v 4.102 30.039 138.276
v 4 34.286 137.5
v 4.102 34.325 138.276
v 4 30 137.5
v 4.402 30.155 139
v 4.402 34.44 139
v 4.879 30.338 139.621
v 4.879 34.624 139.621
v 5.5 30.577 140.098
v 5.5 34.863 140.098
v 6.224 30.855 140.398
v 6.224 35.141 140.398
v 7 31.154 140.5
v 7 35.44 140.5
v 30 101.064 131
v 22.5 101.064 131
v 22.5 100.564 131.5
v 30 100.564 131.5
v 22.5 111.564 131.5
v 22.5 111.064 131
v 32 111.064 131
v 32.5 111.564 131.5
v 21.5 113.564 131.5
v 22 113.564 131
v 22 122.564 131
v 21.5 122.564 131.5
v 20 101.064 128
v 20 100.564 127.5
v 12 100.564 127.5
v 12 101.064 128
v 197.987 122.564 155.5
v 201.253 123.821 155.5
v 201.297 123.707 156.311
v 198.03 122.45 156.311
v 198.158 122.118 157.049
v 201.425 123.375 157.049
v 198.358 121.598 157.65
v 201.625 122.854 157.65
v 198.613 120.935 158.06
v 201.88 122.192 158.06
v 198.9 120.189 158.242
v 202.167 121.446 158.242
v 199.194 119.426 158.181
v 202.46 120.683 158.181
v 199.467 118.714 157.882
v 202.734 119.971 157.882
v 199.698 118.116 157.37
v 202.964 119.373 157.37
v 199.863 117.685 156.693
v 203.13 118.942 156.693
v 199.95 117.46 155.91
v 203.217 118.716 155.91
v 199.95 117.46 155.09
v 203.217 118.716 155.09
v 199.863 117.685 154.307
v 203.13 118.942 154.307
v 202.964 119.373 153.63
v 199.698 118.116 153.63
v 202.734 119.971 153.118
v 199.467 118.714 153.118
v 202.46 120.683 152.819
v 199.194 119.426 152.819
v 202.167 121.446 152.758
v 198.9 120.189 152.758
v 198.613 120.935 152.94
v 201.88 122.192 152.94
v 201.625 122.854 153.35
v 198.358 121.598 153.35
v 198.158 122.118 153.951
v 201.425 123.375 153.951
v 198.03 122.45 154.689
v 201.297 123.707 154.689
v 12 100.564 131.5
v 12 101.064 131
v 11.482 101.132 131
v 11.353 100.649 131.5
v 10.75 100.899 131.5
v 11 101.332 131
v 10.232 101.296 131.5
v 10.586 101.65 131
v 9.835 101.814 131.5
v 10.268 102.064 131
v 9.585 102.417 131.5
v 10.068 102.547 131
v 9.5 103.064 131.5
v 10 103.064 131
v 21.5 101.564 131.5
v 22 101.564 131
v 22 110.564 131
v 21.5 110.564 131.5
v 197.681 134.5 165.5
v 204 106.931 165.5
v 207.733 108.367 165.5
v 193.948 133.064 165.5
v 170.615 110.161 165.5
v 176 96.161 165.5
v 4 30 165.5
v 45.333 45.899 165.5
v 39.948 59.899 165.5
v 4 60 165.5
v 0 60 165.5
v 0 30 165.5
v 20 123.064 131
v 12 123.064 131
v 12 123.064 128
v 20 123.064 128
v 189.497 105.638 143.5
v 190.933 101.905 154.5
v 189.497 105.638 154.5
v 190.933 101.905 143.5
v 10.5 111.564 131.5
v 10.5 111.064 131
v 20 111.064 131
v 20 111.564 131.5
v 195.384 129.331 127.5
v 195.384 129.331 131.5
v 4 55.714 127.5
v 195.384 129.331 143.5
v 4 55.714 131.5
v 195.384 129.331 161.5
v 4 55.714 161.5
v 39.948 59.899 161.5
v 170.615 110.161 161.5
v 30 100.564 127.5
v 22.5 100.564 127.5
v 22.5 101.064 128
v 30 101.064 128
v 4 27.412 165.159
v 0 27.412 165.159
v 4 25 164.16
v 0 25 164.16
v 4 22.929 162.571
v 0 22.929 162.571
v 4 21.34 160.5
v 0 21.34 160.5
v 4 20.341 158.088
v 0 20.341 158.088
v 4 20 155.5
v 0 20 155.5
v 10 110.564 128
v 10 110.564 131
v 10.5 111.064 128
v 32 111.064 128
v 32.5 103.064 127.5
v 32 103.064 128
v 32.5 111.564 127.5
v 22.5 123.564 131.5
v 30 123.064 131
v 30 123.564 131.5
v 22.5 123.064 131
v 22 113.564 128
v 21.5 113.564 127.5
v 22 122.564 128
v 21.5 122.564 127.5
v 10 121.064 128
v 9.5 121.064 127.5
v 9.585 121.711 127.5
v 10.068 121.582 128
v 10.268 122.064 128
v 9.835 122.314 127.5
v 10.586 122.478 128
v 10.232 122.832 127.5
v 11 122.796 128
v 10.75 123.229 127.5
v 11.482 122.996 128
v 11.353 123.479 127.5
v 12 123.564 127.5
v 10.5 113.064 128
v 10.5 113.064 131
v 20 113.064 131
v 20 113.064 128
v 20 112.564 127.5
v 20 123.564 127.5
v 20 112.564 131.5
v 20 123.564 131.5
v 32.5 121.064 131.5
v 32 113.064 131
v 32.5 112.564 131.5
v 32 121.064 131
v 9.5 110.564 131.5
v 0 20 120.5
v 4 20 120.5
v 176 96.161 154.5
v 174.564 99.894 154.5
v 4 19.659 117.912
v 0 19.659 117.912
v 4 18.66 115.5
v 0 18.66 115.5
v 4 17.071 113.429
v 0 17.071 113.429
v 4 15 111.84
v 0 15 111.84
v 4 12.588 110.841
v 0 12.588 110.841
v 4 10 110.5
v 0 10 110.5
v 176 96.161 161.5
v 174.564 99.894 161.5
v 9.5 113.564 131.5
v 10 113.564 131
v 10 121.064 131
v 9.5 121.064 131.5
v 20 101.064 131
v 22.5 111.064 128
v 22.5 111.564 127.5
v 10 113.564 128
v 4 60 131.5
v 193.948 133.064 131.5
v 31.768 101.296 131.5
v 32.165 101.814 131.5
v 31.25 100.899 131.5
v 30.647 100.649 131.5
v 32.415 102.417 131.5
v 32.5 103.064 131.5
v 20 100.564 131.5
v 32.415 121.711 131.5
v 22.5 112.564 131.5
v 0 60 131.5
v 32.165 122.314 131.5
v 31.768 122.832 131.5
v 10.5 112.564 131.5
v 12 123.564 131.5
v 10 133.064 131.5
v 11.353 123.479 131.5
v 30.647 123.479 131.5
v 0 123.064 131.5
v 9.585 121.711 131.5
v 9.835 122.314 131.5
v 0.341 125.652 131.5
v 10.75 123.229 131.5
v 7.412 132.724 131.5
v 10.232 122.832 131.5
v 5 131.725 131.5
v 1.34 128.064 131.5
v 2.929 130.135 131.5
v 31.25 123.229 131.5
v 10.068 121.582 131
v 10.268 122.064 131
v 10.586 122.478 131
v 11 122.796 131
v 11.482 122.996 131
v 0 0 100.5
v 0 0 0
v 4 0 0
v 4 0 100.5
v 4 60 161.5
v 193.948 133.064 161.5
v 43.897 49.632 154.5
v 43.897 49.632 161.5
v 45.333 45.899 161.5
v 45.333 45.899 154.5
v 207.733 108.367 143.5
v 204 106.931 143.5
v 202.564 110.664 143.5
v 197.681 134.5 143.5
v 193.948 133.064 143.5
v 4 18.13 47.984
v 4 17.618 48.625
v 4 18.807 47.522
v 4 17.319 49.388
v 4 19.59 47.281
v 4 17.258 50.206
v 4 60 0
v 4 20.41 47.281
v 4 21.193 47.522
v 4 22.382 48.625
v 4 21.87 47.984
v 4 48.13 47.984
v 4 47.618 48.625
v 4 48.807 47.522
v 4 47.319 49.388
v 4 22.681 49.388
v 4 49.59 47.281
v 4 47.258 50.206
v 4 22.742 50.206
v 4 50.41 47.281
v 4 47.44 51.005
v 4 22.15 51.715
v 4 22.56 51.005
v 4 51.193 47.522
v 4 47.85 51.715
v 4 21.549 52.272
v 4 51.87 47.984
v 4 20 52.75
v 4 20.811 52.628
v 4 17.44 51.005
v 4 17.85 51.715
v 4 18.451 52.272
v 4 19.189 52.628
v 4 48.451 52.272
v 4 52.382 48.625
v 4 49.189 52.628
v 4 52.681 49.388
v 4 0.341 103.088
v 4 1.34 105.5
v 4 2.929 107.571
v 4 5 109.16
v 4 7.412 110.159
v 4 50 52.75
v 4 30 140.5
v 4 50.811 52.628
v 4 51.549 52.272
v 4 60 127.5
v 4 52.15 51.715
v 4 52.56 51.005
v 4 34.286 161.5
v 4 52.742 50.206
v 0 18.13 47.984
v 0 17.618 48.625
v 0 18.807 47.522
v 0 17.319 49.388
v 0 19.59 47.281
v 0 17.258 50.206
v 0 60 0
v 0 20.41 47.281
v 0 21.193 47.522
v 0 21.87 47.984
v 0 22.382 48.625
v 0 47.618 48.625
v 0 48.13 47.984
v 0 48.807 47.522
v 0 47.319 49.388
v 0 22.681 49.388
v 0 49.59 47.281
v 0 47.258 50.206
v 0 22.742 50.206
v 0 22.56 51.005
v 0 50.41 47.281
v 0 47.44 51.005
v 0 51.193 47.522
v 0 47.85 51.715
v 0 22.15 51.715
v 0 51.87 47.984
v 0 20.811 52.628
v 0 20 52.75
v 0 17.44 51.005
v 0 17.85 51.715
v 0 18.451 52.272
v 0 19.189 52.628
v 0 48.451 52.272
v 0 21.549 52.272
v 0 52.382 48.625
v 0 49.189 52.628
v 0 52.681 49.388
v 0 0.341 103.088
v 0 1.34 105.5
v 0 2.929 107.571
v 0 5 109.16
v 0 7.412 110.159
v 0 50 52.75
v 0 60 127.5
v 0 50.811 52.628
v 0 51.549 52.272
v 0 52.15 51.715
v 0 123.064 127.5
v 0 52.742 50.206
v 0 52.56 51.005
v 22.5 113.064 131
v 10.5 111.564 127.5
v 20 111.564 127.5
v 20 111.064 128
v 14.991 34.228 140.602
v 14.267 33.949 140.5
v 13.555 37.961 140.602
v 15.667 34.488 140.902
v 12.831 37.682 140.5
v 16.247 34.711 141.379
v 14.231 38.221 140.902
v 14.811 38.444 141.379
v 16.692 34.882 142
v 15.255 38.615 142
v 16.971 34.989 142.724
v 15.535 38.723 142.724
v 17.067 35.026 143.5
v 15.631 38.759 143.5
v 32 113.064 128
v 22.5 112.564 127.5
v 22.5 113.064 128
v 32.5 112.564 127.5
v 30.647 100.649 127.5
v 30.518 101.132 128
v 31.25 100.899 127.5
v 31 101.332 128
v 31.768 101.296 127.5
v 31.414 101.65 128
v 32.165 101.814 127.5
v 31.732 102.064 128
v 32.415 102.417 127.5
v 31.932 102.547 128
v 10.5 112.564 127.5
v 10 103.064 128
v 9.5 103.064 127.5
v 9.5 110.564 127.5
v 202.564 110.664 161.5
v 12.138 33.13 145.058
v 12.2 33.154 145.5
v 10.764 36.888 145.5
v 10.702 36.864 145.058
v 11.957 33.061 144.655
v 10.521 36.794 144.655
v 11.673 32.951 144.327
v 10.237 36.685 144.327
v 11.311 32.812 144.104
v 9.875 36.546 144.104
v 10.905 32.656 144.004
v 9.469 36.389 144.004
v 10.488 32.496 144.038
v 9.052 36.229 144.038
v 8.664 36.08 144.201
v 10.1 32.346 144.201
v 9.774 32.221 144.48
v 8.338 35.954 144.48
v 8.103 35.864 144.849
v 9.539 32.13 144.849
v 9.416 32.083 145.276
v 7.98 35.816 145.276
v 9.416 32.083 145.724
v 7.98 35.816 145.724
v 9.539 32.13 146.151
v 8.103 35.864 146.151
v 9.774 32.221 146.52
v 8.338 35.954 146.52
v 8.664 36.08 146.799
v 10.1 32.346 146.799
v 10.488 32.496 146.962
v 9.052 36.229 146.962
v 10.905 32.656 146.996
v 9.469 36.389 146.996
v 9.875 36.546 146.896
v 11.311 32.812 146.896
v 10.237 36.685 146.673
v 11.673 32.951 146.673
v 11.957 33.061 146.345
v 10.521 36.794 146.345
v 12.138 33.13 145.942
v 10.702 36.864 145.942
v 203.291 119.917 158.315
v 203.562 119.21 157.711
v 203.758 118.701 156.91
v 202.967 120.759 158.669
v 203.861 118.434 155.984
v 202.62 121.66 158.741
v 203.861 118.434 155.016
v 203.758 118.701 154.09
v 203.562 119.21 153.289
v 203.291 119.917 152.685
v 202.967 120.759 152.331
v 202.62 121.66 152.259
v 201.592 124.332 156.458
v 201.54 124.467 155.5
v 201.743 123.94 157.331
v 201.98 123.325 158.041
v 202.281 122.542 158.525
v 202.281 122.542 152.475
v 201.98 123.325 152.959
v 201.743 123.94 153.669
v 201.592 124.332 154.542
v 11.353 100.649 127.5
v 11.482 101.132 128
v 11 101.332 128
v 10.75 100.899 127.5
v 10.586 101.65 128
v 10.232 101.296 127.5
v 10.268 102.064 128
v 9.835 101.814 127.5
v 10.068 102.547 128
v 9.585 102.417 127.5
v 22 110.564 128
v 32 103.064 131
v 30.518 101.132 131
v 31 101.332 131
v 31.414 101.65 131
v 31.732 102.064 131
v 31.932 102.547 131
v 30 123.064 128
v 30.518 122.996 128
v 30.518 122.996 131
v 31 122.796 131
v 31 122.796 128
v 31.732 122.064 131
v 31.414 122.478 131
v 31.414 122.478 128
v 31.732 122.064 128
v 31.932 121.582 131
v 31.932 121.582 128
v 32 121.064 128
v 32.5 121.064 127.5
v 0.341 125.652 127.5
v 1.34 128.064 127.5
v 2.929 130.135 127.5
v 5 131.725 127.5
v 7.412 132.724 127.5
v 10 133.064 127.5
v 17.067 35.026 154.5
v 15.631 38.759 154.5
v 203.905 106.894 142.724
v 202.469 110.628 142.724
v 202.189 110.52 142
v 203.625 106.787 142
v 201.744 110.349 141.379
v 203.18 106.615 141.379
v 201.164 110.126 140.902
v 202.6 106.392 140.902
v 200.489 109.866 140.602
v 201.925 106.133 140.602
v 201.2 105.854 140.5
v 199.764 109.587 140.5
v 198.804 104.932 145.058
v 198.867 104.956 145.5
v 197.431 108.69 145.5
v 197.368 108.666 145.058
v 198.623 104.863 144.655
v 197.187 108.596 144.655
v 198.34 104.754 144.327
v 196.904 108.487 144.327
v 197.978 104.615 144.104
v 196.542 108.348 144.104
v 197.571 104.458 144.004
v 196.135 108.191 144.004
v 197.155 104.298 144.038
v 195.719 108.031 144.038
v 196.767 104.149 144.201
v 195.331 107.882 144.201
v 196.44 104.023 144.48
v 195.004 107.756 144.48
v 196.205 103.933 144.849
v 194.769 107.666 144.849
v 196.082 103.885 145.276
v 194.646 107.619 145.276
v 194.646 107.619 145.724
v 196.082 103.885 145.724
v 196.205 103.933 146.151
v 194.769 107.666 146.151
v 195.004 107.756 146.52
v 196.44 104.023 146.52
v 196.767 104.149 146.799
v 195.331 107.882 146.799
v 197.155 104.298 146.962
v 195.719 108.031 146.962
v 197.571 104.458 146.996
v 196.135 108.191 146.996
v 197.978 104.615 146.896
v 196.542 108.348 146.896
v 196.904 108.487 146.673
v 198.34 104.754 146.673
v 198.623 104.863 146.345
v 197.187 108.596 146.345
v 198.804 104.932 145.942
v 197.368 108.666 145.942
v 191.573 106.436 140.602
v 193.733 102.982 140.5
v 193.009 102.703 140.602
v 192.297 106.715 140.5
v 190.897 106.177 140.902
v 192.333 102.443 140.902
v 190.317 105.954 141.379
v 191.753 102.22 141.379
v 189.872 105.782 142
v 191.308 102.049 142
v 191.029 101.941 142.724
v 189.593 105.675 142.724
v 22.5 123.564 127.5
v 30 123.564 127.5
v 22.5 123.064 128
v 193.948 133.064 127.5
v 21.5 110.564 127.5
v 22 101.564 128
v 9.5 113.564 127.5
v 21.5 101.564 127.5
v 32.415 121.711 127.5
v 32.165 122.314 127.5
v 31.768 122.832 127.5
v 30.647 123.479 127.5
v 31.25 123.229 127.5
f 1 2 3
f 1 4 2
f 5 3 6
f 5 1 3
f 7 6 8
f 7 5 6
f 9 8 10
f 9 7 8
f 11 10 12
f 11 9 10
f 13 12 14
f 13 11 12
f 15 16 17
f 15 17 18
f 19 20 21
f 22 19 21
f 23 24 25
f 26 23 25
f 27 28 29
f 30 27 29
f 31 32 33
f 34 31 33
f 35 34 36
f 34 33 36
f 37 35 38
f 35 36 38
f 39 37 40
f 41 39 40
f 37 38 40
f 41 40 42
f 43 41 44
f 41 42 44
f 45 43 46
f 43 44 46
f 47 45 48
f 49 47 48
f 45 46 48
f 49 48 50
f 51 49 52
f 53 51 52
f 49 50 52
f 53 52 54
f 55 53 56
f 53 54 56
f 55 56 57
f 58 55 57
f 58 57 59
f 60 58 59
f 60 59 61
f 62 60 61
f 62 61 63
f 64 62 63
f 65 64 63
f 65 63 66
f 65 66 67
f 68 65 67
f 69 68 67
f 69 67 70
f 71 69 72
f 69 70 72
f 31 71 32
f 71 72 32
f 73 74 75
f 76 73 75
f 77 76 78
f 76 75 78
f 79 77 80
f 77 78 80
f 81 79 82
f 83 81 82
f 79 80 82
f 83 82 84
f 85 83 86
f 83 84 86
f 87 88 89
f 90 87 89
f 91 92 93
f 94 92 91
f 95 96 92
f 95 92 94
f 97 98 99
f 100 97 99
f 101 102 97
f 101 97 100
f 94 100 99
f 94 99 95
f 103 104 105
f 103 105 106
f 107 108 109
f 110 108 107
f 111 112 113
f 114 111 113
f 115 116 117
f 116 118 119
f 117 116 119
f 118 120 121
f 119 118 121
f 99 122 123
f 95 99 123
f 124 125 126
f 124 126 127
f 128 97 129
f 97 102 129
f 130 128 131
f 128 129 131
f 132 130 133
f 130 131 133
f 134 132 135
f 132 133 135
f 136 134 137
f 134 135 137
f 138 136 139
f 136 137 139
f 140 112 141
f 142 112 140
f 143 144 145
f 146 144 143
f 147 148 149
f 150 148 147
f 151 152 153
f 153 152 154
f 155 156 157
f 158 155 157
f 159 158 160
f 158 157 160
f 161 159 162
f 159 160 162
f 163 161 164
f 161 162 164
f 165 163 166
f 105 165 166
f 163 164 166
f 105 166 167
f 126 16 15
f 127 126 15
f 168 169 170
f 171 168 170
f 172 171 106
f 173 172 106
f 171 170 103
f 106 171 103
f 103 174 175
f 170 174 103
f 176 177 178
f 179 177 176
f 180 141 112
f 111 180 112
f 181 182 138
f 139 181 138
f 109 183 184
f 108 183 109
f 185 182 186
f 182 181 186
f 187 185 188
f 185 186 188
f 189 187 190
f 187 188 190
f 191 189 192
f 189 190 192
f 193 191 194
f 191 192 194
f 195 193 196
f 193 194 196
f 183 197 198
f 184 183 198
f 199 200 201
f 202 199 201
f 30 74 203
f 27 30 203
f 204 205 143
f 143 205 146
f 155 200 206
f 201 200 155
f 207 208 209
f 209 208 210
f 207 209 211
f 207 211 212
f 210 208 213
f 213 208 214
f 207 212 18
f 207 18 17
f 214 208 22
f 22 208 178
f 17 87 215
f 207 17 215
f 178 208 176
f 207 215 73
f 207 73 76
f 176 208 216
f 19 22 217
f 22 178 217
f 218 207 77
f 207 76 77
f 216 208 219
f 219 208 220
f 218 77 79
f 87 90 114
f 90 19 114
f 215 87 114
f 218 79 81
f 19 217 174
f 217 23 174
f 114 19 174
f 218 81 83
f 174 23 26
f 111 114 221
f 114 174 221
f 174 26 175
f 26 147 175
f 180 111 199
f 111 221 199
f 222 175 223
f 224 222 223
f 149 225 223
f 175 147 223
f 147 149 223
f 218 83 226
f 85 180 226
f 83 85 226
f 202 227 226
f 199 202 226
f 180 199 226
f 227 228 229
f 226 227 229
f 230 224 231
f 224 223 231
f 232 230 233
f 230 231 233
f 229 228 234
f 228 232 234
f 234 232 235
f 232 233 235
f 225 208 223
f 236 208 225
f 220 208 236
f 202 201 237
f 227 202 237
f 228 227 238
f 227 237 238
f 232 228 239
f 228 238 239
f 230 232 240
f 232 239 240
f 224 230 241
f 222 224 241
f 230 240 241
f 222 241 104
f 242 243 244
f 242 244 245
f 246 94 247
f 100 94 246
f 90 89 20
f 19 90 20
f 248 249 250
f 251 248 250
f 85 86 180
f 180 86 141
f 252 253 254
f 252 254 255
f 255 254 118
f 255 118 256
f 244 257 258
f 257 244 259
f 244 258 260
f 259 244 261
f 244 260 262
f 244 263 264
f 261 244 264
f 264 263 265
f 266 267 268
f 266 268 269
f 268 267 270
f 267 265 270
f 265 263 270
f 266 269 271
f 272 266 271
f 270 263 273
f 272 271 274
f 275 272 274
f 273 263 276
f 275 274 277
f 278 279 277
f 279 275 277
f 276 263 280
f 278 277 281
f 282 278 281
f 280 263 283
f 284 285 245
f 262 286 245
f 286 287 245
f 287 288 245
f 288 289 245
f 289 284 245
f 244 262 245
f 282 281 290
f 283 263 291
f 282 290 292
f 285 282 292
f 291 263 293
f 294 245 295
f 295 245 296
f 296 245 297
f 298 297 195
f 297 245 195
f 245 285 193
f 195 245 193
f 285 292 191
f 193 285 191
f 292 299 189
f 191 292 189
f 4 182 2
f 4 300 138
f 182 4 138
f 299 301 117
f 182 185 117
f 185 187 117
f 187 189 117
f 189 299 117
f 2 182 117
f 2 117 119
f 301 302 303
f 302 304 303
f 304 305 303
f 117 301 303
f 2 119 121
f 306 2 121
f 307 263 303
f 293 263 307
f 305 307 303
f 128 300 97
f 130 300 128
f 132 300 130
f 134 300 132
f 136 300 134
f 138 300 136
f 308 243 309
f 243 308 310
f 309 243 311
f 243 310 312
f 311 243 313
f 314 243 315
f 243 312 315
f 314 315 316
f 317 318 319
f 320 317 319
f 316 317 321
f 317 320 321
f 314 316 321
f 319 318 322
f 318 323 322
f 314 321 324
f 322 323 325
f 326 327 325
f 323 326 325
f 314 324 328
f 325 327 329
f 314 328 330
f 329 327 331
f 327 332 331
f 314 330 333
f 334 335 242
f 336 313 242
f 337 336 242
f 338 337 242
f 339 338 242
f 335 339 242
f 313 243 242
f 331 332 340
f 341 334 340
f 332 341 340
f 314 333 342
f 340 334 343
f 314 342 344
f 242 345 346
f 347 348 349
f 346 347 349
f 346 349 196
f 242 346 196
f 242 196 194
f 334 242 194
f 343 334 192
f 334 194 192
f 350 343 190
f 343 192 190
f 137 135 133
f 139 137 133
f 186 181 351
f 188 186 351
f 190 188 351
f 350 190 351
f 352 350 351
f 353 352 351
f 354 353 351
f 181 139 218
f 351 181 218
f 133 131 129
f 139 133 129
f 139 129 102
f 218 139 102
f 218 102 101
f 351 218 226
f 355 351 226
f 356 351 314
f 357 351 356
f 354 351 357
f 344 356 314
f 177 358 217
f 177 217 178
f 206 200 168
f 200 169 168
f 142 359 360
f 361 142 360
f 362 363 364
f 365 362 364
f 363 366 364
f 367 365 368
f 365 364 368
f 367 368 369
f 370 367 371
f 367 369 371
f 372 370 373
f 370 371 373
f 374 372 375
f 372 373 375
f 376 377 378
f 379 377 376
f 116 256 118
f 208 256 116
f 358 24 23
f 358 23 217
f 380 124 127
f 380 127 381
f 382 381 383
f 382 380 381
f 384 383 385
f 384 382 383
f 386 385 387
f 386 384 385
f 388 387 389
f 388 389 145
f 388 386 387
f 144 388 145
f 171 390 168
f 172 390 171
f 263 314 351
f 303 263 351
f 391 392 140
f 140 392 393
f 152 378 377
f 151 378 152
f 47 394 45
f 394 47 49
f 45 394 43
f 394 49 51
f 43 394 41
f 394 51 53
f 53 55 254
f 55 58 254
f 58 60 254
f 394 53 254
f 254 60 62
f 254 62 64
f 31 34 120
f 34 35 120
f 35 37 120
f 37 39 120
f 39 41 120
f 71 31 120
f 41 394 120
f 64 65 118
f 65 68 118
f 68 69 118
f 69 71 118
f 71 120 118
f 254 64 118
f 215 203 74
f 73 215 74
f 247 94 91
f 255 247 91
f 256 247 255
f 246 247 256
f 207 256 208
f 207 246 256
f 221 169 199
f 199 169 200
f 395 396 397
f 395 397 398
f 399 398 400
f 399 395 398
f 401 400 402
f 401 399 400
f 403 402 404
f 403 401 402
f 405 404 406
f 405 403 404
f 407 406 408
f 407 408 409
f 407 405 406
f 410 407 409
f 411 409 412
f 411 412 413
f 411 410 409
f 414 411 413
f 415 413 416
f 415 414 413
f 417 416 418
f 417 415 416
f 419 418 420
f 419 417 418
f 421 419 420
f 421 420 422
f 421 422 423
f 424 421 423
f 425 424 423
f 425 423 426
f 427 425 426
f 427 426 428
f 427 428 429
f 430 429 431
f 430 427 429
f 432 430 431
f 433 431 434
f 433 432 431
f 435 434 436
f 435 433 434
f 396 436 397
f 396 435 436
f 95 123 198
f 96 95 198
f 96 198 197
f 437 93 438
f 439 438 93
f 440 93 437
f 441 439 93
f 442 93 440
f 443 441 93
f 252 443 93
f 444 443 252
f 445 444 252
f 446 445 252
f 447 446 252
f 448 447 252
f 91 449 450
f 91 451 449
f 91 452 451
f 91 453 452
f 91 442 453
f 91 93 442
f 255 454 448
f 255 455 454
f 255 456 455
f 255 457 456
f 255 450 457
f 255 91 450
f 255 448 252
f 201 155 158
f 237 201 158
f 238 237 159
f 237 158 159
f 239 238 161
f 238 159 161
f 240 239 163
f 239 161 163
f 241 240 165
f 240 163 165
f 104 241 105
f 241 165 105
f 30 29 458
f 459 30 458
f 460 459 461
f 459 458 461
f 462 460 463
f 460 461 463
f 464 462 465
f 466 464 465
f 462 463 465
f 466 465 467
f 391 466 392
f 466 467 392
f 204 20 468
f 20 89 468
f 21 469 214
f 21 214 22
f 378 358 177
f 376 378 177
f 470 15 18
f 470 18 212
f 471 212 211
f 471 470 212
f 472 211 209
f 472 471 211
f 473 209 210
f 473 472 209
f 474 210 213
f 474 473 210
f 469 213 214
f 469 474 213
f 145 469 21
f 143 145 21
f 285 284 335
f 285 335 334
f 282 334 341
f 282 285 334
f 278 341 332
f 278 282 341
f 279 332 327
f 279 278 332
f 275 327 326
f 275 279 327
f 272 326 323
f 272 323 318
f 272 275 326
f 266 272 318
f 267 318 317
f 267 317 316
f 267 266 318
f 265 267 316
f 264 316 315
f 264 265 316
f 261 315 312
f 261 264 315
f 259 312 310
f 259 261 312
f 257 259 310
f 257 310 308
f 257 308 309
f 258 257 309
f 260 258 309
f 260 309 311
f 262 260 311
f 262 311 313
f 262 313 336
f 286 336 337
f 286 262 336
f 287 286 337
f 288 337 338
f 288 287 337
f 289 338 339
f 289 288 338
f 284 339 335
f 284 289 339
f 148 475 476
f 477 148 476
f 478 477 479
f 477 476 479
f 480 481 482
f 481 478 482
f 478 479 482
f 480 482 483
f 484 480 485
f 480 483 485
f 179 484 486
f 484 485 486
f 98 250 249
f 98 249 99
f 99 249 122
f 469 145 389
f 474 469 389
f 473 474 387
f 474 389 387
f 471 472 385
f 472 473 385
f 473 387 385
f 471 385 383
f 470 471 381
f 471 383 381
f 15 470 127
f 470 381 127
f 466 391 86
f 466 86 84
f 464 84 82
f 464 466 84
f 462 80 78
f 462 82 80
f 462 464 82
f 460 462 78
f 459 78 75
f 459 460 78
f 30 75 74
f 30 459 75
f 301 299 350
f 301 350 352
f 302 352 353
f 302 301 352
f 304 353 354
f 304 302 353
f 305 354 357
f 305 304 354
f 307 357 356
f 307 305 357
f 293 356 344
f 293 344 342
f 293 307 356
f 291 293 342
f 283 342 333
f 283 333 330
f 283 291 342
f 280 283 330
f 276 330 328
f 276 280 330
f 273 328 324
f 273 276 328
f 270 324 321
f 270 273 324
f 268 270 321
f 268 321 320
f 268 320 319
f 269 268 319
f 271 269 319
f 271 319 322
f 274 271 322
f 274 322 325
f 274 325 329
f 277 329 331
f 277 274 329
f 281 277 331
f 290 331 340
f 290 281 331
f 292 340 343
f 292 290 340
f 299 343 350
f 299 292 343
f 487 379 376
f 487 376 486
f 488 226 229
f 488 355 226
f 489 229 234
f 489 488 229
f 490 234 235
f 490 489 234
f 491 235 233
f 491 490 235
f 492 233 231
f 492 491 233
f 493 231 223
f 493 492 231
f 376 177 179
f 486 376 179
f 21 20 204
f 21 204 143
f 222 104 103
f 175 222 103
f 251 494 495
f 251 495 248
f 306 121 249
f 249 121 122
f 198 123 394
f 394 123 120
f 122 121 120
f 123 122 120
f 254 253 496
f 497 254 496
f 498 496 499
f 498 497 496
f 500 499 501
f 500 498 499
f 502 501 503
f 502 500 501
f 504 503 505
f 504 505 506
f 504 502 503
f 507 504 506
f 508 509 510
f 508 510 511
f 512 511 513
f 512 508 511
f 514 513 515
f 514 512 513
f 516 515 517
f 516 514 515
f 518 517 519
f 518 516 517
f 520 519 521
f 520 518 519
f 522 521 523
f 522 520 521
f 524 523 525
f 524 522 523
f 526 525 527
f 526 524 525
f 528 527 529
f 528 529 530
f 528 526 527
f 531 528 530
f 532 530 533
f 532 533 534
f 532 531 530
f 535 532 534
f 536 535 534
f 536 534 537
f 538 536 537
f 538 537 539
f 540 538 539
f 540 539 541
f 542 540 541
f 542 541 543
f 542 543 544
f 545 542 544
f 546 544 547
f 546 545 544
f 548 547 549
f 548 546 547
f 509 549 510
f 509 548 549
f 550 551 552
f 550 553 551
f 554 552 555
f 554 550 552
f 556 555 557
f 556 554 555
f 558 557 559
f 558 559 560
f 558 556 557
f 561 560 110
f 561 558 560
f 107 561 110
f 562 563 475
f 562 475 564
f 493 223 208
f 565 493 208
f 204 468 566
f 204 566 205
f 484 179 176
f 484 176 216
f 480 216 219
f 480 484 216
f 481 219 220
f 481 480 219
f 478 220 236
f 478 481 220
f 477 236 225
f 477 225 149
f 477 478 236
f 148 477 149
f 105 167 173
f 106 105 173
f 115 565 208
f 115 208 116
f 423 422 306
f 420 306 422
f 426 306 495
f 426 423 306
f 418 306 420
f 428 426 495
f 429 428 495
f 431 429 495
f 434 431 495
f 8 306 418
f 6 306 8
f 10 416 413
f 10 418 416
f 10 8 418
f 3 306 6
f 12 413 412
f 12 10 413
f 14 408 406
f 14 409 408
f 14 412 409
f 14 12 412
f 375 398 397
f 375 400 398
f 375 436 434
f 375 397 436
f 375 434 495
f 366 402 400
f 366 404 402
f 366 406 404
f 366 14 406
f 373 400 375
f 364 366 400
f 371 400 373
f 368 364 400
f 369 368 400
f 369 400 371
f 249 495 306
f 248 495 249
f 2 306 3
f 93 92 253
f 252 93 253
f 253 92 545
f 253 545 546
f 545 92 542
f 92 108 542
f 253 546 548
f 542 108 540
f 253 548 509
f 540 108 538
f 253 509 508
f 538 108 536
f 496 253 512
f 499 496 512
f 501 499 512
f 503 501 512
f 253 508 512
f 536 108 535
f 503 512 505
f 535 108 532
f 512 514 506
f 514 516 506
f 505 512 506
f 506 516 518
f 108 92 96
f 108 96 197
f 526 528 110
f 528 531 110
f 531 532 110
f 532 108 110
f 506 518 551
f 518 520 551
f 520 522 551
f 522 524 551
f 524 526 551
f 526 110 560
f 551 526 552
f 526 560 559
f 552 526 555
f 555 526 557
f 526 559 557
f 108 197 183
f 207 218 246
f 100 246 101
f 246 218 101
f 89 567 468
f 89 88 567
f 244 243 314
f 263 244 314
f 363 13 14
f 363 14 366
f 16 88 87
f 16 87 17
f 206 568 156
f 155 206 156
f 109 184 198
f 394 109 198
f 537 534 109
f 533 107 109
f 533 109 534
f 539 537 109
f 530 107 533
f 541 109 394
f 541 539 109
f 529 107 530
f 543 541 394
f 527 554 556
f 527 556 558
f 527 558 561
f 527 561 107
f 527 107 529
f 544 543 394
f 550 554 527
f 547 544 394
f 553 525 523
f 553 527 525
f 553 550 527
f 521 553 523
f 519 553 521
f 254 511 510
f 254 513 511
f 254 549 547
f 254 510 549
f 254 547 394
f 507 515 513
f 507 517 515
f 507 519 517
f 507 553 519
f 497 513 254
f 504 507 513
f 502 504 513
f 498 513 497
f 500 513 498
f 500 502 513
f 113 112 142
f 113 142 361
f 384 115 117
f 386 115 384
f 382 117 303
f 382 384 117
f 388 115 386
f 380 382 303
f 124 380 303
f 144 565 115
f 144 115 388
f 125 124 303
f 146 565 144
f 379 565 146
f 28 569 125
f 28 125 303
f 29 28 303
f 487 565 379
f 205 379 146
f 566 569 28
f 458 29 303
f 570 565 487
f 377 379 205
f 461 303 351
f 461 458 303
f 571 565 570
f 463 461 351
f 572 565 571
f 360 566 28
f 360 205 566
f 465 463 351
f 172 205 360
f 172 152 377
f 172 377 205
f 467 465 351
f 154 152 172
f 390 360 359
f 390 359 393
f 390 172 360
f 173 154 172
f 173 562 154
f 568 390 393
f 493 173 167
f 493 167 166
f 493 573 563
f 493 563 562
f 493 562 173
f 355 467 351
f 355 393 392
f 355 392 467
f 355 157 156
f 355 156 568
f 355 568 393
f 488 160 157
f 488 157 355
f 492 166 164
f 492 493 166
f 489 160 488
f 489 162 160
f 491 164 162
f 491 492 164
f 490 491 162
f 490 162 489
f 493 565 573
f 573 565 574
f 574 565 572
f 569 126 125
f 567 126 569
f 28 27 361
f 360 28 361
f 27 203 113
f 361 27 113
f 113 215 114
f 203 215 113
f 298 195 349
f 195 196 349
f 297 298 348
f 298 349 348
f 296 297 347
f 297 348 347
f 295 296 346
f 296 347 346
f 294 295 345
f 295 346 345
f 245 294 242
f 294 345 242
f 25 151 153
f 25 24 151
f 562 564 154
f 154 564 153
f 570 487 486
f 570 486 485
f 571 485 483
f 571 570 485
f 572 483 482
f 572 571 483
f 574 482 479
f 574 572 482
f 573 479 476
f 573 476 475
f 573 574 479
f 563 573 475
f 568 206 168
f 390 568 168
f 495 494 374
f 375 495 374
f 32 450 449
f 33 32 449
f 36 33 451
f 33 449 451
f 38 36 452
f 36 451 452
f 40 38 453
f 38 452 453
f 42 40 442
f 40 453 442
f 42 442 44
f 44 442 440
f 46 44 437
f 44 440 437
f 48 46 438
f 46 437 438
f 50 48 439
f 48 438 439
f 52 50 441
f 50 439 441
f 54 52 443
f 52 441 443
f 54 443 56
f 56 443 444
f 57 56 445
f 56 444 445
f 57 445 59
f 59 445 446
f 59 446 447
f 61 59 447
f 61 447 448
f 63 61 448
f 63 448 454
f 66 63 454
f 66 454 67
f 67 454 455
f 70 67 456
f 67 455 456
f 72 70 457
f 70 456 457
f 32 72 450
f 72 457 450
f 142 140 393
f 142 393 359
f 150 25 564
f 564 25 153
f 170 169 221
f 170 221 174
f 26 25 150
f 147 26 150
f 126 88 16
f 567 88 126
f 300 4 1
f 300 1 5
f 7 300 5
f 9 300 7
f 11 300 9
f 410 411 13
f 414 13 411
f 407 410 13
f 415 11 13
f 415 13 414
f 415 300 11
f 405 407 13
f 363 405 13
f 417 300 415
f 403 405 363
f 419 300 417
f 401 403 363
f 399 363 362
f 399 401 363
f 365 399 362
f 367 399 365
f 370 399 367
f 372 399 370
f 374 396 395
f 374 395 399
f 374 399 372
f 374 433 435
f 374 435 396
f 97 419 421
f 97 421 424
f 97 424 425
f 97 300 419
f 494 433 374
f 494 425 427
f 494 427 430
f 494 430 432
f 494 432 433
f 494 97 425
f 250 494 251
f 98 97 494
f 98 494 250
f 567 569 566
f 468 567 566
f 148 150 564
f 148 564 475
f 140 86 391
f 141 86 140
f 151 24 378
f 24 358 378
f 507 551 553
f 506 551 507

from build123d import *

# Parameters (mm, degrees)
SKETCH_1_W               = 165.5
SKETCH_1_H               = 60
EXTRUDE_1_DEPTH          = 4
EXTRUDE_2_DEPTH          = 4
SKETCH_3_W               = 214.285714285
SKETCH_3_H               = 25
EXTRUDE_5_DEPTH          = 4
SKETCH_4_R               = 2.75
CUT_EXTRUDE_1_DEPTH      = 4
SKETCH_5_W               = 55
SKETCH_5_H               = 20
CUT_EXTRUDE_2_DEPTH      = 4
FILLET_1_R               = 10
SKETCH_6_W               = 186.285714285
SKETCH_6_H               = 14
CUT_EXTRUDE_3_DEPTH      = 4
SKETCH_7_R               = 1.5
CUT_EXTRUDE_4_DEPTH      = 4
FILLET_2_R               = 3
CUT_EXTRUDE_5_DEPTH      = 4
FILLET_1_OF_MIRROR_1_R   = 10
FILLET_2_OF_MIRROR_1_R   = 3
CUT_EXTRUDE_6_DEPTH      = 292.712781796
CUT_EXTRUDE_6_DEPTH_BACK = 4
SKETCH_9_W               = 205.055051827
SKETCH_9_H               = 163.821453507
CUT_EXTRUDE_7_DEPTH      = 293.240221501
SKETCH_11_W              = 207.248718004
SKETCH_11_H              = 34
EXTRUDE_6_DEPTH          = 4
SKETCH_12_W              = 22
SKETCH_12_H              = 28
EXTRUDE_7_DEPTH          = 4
SKETCH_13_R              = 2.75
CUT_EXTRUDE_8_DEPTH      = 4
EXTRUDE_8_DEPTH          = 4
FILLET_3_R               = 10
SKETCH_15_W              = 10
SKETCH_15_H              = 10
CUT_EXTRUDE_9_DEPTH      = 4
FILLET_4_R               = 2
CHAMFER_1_SIZE           = 0.5
CHAMFER_2_SIZE           = 0.5


with BuildPart() as part:
    # 草图1 → 凸台-拉伸1 (new body)
    with BuildSketch(Plane(origin=(0, 0, 0), x_dir=(0, 0, -1), z_dir=(1, 0, 0))):
        with Locations((82.75, 30)):
            Rectangle(SKETCH_1_W, SKETCH_1_H)
    extrude_1 = extrude(amount=EXTRUDE_1_DEPTH)

    # 草图2 → 凸台-拉伸2 (add)
    with BuildSketch(Plane(origin=(0, 0, -165.5), x_dir=(-1, 0, 0), z_dir=(0, 0, -1))):
        Polygon((-4, 30), (-204, 106.930925816), (-193.94769236, 133.06425915), (-4, 60), align=None)
    extrude_2 = extrude(amount=-EXTRUDE_2_DEPTH)

    # 草图3 → 凸台-拉伸5 (add)
    with BuildSketch(Plane(origin=(-9.536752084, 24.793025648, 0), x_dir=(0.9333333333333335, 0.3590109871422999, 0), z_dir=(0.3590109871422999, -0.9333333333333335, 0))):
        with Locations((121.646520091, -153)):
            Rectangle(SKETCH_3_W, SKETCH_3_H)
    extrude_5 = extrude(amount=-EXTRUDE_5_DEPTH)

    # 草图4 → 切除-拉伸1 (cut)
    with BuildSketch(Plane(origin=(4, 0, 0), x_dir=(0, 0, -1), z_dir=(1, 0, 0))):
        with Locations((50, 50)):
            Circle(SKETCH_4_R)
        with Locations((50, 20)):
            Circle(SKETCH_4_R)
    cut_extrude_1 = extrude(amount=-CUT_EXTRUDE_1_DEPTH, mode=Mode.SUBTRACT)

    # 草图5 → 切除-拉伸2 (cut)
    with BuildSketch(Plane(origin=(4, 0, 0), x_dir=(0, 0, -1), z_dir=(1, 0, 0))):
        with Locations((138, 10)):
            Rectangle(SKETCH_5_W, SKETCH_5_H)
    cut_extrude_2 = extrude(amount=-CUT_EXTRUDE_2_DEPTH, mode=Mode.SUBTRACT)

    # 圆角1
    fillet_1_edges = [part.edges().sort_by_distance(p)[0] for p in [
        (2, 20, -165.5),
        (2, 20, -110.5),
        (2, 0, -110.5),
    ]]
    fillet(fillet_1_edges, radius=FILLET_1_R - 0.0001)  # a hair under: the kernel refuses the full size

    # 草图6 → 切除-拉伸3 (cut)
    with BuildSketch(Plane(origin=(-9.536752084, 24.793025648, 0), x_dir=(0.9333333333333335, 0.35901098714229984, 0), z_dir=(0.35901098714229984, -0.9333333333333335, 0))):
        with Locations((121.646520091, -147.5)):
            Rectangle(SKETCH_6_W, SKETCH_6_H)
    cut_extrude_3 = extrude(amount=-CUT_EXTRUDE_3_DEPTH, mode=Mode.SUBTRACT)

    # 草图7 → 切除-拉伸4 (cut)
    with BuildSketch(Plane(origin=(-9.536752084, 24.793025648, 0), x_dir=(0.9333333333333335, 0.35901098714229984, 0), z_dir=(0.35901098714229984, -0.9333333333333335, 0))):
        with Locations((221.789377233, -145.5)):
            Circle(SKETCH_7_R)
        with Locations((21.789377233, -145.5)):
            Circle(SKETCH_7_R)
    cut_extrude_4 = extrude(amount=-CUT_EXTRUDE_4_DEPTH, mode=Mode.SUBTRACT)

    # 圆角2
    fillet_2_edges = [part.edges().sort_by_distance(p)[0] for p in [
        (4, 32.142857143, -140.5),
        (203.281978026, 108.797592483, -140.5),
        (16.348644692, 36.892820487, -140.5),
        (190.215311359, 103.771438663, -140.5),
    ]]
    fillet(fillet_2_edges, radius=FILLET_2_R)

    # 草图8 → 切除-拉伸5 (cut)
    with BuildSketch(Plane.XY.offset(-161.5)):
        Polygon((45.333333333, 45.899058002), (39.948168526, 59.899058002), (170.614835193, 110.160596202), (176, 96.160596202), align=None)
    cut_extrude_5 = extrude(amount=-CUT_EXTRUDE_5_DEPTH, mode=Mode.SUBTRACT)

    # 镜向1: 凸台-拉伸1, 凸台-拉伸2, 凸台-拉伸5, 切除-拉伸1, 切除-拉伸2, 切除-拉伸3, 切除-拉伸4, 切除-拉伸5 across plane
    add(extrude_1.mirror(Plane.XY))
    add(extrude_2.mirror(Plane.XY))
    add(extrude_5.mirror(Plane.XY))
    add(cut_extrude_1.mirror(Plane.XY), mode=Mode.SUBTRACT)
    add(cut_extrude_2.mirror(Plane.XY), mode=Mode.SUBTRACT)
    add(cut_extrude_3.mirror(Plane.XY), mode=Mode.SUBTRACT)
    add(cut_extrude_4.mirror(Plane.XY), mode=Mode.SUBTRACT)
    add(cut_extrude_5.mirror(Plane.XY), mode=Mode.SUBTRACT)

    # 圆角1 of 镜向1
    fillet_1_of_mirror_1_edges = [part.edges().sort_by_distance(p)[0] for p in [
        (2, 20, 165.5),
        (2, 20, 110.5),
        (2, 0, 110.5),
    ]]
    fillet(fillet_1_of_mirror_1_edges, radius=FILLET_1_OF_MIRROR_1_R - 0.0001)  # a hair under: the kernel refuses the full size

    # 圆角2 of 镜向1
    fillet_2_of_mirror_1_edges = [part.edges().sort_by_distance(p)[0] for p in [
        (4, 32.142857143, 140.5),
        (203.281978026, 108.797592483, 140.5),
        (16.348644692, 36.892820487, 140.5),
        (190.215311359, 103.771438663, 140.5),
    ]]
    fillet(fillet_2_of_mirror_1_edges, radius=FILLET_2_OF_MIRROR_1_R)

    # 草图9 → 切除-拉伸6 (cut, two sides: drawn at the far end of the back side and taken through both)
    with BuildSketch(Plane(origin=(4, 0, 0), x_dir=(0, 0, -1), z_dir=(1, 0, 0)).offset(-CUT_EXTRUDE_6_DEPTH_BACK)):
        with Locations((102.527525913, 81.910726754)):
            Rectangle(SKETCH_9_W, SKETCH_9_H)
    extrude(amount=CUT_EXTRUDE_6_DEPTH + CUT_EXTRUDE_6_DEPTH_BACK, mode=Mode.SUBTRACT)

    # 草图10 → 切除-拉伸7 (cut, through all)
    with BuildSketch(Plane.XY.offset(161.5)):
        Polygon((174.563956051, 99.893929535), (43.897289385, 49.632391335), (45.333333333, 45.899058002), (176, 96.160596202), align=None)
    extrude(amount=-CUT_EXTRUDE_7_DEPTH, mode=Mode.SUBTRACT)

    # 草图11 → 凸台-拉伸6 (add)
    with BuildSketch(Plane(origin=(-19.589059724, 50.926358981, 0), x_dir=(0.9333333333333335, 0.3590109871422999, 0), z_dir=(-0.3590109871422999, 0.9333333333333335, 0))):
        with Locations((125.165018231, -148.5)):
            Rectangle(SKETCH_11_W, SKETCH_11_H)
    extrude(amount=-EXTRUDE_6_DEPTH)

    # 草图12 → 凸台-拉伸7 (add)
    with BuildSketch(Plane(origin=(213.536752084, 82.137900168, 0), x_dir=(0, 0, -1), z_dir=(0.9333333333333338, 0.35901098714229945, 0))):
        with Locations((-154.5, 40.563956051)):
            Rectangle(SKETCH_12_W, SKETCH_12_H)
    extrude(amount=EXTRUDE_7_DEPTH)

    # 草图13 → 切除-拉伸8 (cut)
    with BuildSketch(Plane(origin=(217.270085418, 83.573944117, 0), x_dir=(0, 0, -1), z_dir=(0.9333333333333338, 0.35901098714229945, 0))):
        with Locations(Location((-155.5, 40.563956051, 0), (0, 0, 90))):
            Circle(SKETCH_13_R)
    extrude(amount=-CUT_EXTRUDE_8_DEPTH, mode=Mode.SUBTRACT)

    # 草图14 → 凸台-拉伸8 (add)
    with BuildSketch(Plane(origin=(0, 0, 131.5), x_dir=(-1, 0, 0), z_dir=(0, 0, -1))):
        Polygon((-4, 55.714285714), (-4, 60), (0, 60), (0, 133.06425915), (-193.94769236, 133.06425915), (-195.383736309, 129.330925816), align=None)
    extrude(amount=EXTRUDE_8_DEPTH)

    # 圆角3
    fillet_3_edges = [part.edges().sort_by_distance(p)[0] for p in [
        (0, 133.06425915, 129.5),
    ]]
    fillet(fillet_3_edges, radius=FILLET_3_R)

    # 草图15 → 切除-拉伸9 (cut)
    with BuildSketch(Plane.XY.offset(131.5)):
        with Locations((15, 118.06425915)):
            Rectangle(SKETCH_15_W, SKETCH_15_H)
        with Locations((27, 118.06425915)):
            Rectangle(SKETCH_15_W, SKETCH_15_H)
        with Locations((15, 106.06425915)):
            Rectangle(SKETCH_15_W, SKETCH_15_H)
        with Locations((27, 106.06425915)):
            Rectangle(SKETCH_15_W, SKETCH_15_H)
    extrude(amount=-CUT_EXTRUDE_9_DEPTH, mode=Mode.SUBTRACT)

    # 圆角4
    fillet_4_edges = [part.edges().sort_by_distance(p)[0] for p in [
        (32, 123.06425915, 129.5),
        (10, 101.06425915, 129.5),
        (32, 101.06425915, 129.5),
        (10, 123.06425915, 129.5),
    ]]
    fillet(fillet_4_edges, radius=FILLET_4_R)

    # 倒角1
    chamfer_1_edges = [part.edges().sort_by_distance(p)[0] for p in [
        (22, 118.06425915, 127.5),
        (22, 113.06425915, 129.5),
        (22, 123.06425915, 129.5),
        (32, 117.06425915, 127.5),
        (27, 113.06425915, 127.5),
        (22, 118.06425915, 131.5),
        (27, 113.06425915, 131.5),
        (32, 117.06425915, 131.5),
        (10, 107.06425915, 127.5),
        (15, 111.06425915, 127.5),
        (10, 111.06425915, 129.5),
        (10, 107.06425915, 131.5),
        (15, 111.06425915, 131.5),
        (22, 106.06425915, 127.5),
        (22, 101.06425915, 129.5),
        (27, 111.06425915, 127.5),
        (22, 111.06425915, 129.5),
        (26, 101.06425915, 127.5),
        (22, 106.06425915, 131.5),
        (26, 101.06425915, 131.5),
        (27, 111.06425915, 131.5),
        (10, 113.06425915, 129.5),
        (16, 123.06425915, 127.5),
        (15, 113.06425915, 127.5),
        (15, 113.06425915, 131.5),
        (16, 123.06425915, 131.5),
        (26, 123.06425915, 131.5),
        (26, 123.06425915, 127.5),
        (10, 117.06425915, 131.5),
        (10, 117.06425915, 127.5),
        (16, 101.06425915, 131.5),
        (16, 101.06425915, 127.5),
        (32, 107.06425915, 131.5),
        (32, 107.06425915, 127.5),
        (31.414213562, 122.478472712, 131.5),
        (31.414213562, 122.478472712, 127.5),
        (10.585786438, 122.478472712, 131.5),
        (10.585786438, 122.478472712, 127.5),
        (10.585786438, 101.650045587, 131.5),
        (10.585786438, 101.650045587, 127.5),
        (31.414213562, 101.650045587, 131.5),
        (31.414213562, 101.650045587, 127.5),
    ]]
    chamfer(chamfer_1_edges, length=CHAMFER_1_SIZE)

    # 倒角2
    chamfer_2_edges = [part.edges().sort_by_distance(p)[0] for p in [
        (203.694459728, 118.866969765, 155.5),
    ]]
    chamfer(chamfer_2_edges, length=CHAMFER_2_SIZE)


solid = part.part
